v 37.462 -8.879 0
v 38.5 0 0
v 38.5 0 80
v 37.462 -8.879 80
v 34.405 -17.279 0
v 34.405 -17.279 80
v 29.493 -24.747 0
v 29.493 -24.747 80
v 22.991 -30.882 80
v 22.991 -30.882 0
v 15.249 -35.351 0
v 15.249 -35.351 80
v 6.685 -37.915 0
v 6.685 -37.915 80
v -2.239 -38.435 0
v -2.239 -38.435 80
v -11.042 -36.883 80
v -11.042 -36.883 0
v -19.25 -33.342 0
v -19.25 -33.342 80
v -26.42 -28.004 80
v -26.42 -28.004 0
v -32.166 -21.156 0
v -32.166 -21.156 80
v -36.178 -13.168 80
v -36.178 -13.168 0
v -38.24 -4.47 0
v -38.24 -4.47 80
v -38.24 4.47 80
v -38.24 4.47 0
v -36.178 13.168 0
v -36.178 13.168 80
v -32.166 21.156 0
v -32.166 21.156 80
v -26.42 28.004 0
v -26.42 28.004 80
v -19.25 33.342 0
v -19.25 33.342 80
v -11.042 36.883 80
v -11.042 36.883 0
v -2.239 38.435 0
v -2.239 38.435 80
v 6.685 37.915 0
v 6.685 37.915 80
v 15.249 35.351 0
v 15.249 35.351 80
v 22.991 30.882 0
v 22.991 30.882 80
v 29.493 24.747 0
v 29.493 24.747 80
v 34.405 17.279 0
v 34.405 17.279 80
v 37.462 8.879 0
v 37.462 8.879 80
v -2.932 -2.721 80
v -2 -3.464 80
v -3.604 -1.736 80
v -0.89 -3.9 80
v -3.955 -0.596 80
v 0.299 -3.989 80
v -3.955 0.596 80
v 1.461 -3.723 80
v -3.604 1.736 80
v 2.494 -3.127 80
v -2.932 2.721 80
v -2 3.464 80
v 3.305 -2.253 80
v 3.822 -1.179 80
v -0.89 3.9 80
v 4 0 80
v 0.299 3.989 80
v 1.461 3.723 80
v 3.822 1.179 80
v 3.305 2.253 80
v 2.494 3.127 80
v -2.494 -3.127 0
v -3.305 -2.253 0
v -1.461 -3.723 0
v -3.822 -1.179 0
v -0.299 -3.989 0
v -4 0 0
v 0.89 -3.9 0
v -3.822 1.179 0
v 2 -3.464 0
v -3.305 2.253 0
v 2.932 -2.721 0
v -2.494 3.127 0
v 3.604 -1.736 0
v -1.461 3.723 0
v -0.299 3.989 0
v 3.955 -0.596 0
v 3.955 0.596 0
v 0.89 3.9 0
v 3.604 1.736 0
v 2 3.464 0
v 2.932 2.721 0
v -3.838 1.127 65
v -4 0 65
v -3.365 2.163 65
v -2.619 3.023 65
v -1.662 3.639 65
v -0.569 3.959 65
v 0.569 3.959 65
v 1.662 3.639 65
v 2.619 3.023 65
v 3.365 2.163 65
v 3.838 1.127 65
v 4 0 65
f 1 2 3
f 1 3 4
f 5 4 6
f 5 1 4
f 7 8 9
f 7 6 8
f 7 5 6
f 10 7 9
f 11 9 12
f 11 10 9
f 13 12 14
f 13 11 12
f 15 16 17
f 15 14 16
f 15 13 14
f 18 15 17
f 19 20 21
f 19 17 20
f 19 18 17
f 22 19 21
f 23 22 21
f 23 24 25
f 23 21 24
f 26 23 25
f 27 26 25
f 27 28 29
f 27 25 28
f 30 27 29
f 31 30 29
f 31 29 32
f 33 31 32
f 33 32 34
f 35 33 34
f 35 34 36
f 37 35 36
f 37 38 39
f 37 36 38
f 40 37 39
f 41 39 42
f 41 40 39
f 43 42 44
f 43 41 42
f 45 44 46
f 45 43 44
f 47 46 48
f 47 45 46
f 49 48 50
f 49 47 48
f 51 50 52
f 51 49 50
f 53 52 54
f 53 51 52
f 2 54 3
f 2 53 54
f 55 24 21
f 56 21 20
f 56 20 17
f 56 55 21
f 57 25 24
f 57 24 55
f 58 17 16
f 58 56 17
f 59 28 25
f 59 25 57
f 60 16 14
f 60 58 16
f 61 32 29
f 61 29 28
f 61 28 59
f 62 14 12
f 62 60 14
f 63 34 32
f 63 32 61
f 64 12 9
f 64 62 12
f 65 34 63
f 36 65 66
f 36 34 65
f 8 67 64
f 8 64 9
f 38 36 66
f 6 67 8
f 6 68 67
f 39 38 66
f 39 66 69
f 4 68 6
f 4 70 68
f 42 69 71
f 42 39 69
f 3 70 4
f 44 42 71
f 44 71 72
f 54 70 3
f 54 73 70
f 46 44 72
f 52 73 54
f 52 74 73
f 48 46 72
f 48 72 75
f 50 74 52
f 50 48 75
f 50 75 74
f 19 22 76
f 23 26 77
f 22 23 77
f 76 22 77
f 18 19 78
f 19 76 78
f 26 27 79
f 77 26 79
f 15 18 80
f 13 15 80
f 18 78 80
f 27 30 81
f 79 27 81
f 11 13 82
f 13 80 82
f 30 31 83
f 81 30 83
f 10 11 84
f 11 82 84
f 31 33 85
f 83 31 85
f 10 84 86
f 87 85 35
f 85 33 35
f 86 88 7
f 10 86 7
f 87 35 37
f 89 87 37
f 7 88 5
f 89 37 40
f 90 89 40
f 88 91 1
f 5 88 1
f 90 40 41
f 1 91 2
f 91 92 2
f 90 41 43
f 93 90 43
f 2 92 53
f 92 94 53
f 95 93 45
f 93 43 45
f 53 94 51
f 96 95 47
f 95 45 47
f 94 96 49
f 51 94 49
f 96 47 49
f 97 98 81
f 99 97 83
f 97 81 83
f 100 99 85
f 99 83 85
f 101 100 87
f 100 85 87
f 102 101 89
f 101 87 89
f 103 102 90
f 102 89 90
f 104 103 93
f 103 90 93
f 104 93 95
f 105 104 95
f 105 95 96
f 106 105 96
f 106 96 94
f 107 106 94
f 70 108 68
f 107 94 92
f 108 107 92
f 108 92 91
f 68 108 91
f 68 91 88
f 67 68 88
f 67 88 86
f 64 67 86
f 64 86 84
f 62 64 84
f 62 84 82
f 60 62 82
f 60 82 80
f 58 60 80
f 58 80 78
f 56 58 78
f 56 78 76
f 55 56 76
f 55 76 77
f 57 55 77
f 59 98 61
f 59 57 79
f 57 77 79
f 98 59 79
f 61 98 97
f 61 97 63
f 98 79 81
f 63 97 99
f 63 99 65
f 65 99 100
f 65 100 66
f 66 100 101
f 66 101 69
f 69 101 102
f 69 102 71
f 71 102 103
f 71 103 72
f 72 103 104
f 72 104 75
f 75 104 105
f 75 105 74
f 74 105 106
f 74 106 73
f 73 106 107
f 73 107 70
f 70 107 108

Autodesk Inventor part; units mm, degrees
ref_plane "YZ Plane" through (0, 0, 0) normal (1, 0, 0) x (0, 1, 0)
ref_plane "XZ Plane" through (0, 0, 0) normal (0, 1, 0) x (-1, 0, 0)
ref_plane "XY Plane" through (0, 0, 0) normal (0, 0, 1) x (1, 0, 0)
sketch "Sketch1" plane through (0, 0, 0) normal (0, 0, 1) x (1, 0, 0)
  point P0 (0, 0)
sketch "Sketch2" plane through (0, 0, 0) normal (0, 0, 1) x (1, 0, 0)
  point P0 (0, 0)
sketch "Sketch3" plane through (0, 0, 0) normal (0, 0, 1) x (1, 0, 0)
  circle A0 centre (0, 0) radius 38.5
  dimension "d0" = 77
extrude "Extrusion1" add sketch "Sketch3" along normal blind 80
sketch "Sketch4" plane through (0, 0, 80) normal (0, 0, 1) x (1, 0, 0)
  circle A0 centre (0, 0) radius 4
  dimension "d3" = 8
extrude "Extrusion2" cut sketch "Sketch4" against normal blind 15
sketch "Sketch5" plane through (0, 0, 80) normal (0, 0, 1) x (1, 0, 0)
  point P0 (0, 0)
sketch "Sketch6" plane through (0, 0, 0) normal (0, 0, -1) x (-1, 0, 0)
  circle A0 centre (0, 0) radius 4 projected
  circle A1 centre (0, 0) radius 4
  dimension "d6" = 8
extrude "Extrusion3" cut sketch "Sketch6" against normal blind 150
properties part number "roller of 4 cm"
